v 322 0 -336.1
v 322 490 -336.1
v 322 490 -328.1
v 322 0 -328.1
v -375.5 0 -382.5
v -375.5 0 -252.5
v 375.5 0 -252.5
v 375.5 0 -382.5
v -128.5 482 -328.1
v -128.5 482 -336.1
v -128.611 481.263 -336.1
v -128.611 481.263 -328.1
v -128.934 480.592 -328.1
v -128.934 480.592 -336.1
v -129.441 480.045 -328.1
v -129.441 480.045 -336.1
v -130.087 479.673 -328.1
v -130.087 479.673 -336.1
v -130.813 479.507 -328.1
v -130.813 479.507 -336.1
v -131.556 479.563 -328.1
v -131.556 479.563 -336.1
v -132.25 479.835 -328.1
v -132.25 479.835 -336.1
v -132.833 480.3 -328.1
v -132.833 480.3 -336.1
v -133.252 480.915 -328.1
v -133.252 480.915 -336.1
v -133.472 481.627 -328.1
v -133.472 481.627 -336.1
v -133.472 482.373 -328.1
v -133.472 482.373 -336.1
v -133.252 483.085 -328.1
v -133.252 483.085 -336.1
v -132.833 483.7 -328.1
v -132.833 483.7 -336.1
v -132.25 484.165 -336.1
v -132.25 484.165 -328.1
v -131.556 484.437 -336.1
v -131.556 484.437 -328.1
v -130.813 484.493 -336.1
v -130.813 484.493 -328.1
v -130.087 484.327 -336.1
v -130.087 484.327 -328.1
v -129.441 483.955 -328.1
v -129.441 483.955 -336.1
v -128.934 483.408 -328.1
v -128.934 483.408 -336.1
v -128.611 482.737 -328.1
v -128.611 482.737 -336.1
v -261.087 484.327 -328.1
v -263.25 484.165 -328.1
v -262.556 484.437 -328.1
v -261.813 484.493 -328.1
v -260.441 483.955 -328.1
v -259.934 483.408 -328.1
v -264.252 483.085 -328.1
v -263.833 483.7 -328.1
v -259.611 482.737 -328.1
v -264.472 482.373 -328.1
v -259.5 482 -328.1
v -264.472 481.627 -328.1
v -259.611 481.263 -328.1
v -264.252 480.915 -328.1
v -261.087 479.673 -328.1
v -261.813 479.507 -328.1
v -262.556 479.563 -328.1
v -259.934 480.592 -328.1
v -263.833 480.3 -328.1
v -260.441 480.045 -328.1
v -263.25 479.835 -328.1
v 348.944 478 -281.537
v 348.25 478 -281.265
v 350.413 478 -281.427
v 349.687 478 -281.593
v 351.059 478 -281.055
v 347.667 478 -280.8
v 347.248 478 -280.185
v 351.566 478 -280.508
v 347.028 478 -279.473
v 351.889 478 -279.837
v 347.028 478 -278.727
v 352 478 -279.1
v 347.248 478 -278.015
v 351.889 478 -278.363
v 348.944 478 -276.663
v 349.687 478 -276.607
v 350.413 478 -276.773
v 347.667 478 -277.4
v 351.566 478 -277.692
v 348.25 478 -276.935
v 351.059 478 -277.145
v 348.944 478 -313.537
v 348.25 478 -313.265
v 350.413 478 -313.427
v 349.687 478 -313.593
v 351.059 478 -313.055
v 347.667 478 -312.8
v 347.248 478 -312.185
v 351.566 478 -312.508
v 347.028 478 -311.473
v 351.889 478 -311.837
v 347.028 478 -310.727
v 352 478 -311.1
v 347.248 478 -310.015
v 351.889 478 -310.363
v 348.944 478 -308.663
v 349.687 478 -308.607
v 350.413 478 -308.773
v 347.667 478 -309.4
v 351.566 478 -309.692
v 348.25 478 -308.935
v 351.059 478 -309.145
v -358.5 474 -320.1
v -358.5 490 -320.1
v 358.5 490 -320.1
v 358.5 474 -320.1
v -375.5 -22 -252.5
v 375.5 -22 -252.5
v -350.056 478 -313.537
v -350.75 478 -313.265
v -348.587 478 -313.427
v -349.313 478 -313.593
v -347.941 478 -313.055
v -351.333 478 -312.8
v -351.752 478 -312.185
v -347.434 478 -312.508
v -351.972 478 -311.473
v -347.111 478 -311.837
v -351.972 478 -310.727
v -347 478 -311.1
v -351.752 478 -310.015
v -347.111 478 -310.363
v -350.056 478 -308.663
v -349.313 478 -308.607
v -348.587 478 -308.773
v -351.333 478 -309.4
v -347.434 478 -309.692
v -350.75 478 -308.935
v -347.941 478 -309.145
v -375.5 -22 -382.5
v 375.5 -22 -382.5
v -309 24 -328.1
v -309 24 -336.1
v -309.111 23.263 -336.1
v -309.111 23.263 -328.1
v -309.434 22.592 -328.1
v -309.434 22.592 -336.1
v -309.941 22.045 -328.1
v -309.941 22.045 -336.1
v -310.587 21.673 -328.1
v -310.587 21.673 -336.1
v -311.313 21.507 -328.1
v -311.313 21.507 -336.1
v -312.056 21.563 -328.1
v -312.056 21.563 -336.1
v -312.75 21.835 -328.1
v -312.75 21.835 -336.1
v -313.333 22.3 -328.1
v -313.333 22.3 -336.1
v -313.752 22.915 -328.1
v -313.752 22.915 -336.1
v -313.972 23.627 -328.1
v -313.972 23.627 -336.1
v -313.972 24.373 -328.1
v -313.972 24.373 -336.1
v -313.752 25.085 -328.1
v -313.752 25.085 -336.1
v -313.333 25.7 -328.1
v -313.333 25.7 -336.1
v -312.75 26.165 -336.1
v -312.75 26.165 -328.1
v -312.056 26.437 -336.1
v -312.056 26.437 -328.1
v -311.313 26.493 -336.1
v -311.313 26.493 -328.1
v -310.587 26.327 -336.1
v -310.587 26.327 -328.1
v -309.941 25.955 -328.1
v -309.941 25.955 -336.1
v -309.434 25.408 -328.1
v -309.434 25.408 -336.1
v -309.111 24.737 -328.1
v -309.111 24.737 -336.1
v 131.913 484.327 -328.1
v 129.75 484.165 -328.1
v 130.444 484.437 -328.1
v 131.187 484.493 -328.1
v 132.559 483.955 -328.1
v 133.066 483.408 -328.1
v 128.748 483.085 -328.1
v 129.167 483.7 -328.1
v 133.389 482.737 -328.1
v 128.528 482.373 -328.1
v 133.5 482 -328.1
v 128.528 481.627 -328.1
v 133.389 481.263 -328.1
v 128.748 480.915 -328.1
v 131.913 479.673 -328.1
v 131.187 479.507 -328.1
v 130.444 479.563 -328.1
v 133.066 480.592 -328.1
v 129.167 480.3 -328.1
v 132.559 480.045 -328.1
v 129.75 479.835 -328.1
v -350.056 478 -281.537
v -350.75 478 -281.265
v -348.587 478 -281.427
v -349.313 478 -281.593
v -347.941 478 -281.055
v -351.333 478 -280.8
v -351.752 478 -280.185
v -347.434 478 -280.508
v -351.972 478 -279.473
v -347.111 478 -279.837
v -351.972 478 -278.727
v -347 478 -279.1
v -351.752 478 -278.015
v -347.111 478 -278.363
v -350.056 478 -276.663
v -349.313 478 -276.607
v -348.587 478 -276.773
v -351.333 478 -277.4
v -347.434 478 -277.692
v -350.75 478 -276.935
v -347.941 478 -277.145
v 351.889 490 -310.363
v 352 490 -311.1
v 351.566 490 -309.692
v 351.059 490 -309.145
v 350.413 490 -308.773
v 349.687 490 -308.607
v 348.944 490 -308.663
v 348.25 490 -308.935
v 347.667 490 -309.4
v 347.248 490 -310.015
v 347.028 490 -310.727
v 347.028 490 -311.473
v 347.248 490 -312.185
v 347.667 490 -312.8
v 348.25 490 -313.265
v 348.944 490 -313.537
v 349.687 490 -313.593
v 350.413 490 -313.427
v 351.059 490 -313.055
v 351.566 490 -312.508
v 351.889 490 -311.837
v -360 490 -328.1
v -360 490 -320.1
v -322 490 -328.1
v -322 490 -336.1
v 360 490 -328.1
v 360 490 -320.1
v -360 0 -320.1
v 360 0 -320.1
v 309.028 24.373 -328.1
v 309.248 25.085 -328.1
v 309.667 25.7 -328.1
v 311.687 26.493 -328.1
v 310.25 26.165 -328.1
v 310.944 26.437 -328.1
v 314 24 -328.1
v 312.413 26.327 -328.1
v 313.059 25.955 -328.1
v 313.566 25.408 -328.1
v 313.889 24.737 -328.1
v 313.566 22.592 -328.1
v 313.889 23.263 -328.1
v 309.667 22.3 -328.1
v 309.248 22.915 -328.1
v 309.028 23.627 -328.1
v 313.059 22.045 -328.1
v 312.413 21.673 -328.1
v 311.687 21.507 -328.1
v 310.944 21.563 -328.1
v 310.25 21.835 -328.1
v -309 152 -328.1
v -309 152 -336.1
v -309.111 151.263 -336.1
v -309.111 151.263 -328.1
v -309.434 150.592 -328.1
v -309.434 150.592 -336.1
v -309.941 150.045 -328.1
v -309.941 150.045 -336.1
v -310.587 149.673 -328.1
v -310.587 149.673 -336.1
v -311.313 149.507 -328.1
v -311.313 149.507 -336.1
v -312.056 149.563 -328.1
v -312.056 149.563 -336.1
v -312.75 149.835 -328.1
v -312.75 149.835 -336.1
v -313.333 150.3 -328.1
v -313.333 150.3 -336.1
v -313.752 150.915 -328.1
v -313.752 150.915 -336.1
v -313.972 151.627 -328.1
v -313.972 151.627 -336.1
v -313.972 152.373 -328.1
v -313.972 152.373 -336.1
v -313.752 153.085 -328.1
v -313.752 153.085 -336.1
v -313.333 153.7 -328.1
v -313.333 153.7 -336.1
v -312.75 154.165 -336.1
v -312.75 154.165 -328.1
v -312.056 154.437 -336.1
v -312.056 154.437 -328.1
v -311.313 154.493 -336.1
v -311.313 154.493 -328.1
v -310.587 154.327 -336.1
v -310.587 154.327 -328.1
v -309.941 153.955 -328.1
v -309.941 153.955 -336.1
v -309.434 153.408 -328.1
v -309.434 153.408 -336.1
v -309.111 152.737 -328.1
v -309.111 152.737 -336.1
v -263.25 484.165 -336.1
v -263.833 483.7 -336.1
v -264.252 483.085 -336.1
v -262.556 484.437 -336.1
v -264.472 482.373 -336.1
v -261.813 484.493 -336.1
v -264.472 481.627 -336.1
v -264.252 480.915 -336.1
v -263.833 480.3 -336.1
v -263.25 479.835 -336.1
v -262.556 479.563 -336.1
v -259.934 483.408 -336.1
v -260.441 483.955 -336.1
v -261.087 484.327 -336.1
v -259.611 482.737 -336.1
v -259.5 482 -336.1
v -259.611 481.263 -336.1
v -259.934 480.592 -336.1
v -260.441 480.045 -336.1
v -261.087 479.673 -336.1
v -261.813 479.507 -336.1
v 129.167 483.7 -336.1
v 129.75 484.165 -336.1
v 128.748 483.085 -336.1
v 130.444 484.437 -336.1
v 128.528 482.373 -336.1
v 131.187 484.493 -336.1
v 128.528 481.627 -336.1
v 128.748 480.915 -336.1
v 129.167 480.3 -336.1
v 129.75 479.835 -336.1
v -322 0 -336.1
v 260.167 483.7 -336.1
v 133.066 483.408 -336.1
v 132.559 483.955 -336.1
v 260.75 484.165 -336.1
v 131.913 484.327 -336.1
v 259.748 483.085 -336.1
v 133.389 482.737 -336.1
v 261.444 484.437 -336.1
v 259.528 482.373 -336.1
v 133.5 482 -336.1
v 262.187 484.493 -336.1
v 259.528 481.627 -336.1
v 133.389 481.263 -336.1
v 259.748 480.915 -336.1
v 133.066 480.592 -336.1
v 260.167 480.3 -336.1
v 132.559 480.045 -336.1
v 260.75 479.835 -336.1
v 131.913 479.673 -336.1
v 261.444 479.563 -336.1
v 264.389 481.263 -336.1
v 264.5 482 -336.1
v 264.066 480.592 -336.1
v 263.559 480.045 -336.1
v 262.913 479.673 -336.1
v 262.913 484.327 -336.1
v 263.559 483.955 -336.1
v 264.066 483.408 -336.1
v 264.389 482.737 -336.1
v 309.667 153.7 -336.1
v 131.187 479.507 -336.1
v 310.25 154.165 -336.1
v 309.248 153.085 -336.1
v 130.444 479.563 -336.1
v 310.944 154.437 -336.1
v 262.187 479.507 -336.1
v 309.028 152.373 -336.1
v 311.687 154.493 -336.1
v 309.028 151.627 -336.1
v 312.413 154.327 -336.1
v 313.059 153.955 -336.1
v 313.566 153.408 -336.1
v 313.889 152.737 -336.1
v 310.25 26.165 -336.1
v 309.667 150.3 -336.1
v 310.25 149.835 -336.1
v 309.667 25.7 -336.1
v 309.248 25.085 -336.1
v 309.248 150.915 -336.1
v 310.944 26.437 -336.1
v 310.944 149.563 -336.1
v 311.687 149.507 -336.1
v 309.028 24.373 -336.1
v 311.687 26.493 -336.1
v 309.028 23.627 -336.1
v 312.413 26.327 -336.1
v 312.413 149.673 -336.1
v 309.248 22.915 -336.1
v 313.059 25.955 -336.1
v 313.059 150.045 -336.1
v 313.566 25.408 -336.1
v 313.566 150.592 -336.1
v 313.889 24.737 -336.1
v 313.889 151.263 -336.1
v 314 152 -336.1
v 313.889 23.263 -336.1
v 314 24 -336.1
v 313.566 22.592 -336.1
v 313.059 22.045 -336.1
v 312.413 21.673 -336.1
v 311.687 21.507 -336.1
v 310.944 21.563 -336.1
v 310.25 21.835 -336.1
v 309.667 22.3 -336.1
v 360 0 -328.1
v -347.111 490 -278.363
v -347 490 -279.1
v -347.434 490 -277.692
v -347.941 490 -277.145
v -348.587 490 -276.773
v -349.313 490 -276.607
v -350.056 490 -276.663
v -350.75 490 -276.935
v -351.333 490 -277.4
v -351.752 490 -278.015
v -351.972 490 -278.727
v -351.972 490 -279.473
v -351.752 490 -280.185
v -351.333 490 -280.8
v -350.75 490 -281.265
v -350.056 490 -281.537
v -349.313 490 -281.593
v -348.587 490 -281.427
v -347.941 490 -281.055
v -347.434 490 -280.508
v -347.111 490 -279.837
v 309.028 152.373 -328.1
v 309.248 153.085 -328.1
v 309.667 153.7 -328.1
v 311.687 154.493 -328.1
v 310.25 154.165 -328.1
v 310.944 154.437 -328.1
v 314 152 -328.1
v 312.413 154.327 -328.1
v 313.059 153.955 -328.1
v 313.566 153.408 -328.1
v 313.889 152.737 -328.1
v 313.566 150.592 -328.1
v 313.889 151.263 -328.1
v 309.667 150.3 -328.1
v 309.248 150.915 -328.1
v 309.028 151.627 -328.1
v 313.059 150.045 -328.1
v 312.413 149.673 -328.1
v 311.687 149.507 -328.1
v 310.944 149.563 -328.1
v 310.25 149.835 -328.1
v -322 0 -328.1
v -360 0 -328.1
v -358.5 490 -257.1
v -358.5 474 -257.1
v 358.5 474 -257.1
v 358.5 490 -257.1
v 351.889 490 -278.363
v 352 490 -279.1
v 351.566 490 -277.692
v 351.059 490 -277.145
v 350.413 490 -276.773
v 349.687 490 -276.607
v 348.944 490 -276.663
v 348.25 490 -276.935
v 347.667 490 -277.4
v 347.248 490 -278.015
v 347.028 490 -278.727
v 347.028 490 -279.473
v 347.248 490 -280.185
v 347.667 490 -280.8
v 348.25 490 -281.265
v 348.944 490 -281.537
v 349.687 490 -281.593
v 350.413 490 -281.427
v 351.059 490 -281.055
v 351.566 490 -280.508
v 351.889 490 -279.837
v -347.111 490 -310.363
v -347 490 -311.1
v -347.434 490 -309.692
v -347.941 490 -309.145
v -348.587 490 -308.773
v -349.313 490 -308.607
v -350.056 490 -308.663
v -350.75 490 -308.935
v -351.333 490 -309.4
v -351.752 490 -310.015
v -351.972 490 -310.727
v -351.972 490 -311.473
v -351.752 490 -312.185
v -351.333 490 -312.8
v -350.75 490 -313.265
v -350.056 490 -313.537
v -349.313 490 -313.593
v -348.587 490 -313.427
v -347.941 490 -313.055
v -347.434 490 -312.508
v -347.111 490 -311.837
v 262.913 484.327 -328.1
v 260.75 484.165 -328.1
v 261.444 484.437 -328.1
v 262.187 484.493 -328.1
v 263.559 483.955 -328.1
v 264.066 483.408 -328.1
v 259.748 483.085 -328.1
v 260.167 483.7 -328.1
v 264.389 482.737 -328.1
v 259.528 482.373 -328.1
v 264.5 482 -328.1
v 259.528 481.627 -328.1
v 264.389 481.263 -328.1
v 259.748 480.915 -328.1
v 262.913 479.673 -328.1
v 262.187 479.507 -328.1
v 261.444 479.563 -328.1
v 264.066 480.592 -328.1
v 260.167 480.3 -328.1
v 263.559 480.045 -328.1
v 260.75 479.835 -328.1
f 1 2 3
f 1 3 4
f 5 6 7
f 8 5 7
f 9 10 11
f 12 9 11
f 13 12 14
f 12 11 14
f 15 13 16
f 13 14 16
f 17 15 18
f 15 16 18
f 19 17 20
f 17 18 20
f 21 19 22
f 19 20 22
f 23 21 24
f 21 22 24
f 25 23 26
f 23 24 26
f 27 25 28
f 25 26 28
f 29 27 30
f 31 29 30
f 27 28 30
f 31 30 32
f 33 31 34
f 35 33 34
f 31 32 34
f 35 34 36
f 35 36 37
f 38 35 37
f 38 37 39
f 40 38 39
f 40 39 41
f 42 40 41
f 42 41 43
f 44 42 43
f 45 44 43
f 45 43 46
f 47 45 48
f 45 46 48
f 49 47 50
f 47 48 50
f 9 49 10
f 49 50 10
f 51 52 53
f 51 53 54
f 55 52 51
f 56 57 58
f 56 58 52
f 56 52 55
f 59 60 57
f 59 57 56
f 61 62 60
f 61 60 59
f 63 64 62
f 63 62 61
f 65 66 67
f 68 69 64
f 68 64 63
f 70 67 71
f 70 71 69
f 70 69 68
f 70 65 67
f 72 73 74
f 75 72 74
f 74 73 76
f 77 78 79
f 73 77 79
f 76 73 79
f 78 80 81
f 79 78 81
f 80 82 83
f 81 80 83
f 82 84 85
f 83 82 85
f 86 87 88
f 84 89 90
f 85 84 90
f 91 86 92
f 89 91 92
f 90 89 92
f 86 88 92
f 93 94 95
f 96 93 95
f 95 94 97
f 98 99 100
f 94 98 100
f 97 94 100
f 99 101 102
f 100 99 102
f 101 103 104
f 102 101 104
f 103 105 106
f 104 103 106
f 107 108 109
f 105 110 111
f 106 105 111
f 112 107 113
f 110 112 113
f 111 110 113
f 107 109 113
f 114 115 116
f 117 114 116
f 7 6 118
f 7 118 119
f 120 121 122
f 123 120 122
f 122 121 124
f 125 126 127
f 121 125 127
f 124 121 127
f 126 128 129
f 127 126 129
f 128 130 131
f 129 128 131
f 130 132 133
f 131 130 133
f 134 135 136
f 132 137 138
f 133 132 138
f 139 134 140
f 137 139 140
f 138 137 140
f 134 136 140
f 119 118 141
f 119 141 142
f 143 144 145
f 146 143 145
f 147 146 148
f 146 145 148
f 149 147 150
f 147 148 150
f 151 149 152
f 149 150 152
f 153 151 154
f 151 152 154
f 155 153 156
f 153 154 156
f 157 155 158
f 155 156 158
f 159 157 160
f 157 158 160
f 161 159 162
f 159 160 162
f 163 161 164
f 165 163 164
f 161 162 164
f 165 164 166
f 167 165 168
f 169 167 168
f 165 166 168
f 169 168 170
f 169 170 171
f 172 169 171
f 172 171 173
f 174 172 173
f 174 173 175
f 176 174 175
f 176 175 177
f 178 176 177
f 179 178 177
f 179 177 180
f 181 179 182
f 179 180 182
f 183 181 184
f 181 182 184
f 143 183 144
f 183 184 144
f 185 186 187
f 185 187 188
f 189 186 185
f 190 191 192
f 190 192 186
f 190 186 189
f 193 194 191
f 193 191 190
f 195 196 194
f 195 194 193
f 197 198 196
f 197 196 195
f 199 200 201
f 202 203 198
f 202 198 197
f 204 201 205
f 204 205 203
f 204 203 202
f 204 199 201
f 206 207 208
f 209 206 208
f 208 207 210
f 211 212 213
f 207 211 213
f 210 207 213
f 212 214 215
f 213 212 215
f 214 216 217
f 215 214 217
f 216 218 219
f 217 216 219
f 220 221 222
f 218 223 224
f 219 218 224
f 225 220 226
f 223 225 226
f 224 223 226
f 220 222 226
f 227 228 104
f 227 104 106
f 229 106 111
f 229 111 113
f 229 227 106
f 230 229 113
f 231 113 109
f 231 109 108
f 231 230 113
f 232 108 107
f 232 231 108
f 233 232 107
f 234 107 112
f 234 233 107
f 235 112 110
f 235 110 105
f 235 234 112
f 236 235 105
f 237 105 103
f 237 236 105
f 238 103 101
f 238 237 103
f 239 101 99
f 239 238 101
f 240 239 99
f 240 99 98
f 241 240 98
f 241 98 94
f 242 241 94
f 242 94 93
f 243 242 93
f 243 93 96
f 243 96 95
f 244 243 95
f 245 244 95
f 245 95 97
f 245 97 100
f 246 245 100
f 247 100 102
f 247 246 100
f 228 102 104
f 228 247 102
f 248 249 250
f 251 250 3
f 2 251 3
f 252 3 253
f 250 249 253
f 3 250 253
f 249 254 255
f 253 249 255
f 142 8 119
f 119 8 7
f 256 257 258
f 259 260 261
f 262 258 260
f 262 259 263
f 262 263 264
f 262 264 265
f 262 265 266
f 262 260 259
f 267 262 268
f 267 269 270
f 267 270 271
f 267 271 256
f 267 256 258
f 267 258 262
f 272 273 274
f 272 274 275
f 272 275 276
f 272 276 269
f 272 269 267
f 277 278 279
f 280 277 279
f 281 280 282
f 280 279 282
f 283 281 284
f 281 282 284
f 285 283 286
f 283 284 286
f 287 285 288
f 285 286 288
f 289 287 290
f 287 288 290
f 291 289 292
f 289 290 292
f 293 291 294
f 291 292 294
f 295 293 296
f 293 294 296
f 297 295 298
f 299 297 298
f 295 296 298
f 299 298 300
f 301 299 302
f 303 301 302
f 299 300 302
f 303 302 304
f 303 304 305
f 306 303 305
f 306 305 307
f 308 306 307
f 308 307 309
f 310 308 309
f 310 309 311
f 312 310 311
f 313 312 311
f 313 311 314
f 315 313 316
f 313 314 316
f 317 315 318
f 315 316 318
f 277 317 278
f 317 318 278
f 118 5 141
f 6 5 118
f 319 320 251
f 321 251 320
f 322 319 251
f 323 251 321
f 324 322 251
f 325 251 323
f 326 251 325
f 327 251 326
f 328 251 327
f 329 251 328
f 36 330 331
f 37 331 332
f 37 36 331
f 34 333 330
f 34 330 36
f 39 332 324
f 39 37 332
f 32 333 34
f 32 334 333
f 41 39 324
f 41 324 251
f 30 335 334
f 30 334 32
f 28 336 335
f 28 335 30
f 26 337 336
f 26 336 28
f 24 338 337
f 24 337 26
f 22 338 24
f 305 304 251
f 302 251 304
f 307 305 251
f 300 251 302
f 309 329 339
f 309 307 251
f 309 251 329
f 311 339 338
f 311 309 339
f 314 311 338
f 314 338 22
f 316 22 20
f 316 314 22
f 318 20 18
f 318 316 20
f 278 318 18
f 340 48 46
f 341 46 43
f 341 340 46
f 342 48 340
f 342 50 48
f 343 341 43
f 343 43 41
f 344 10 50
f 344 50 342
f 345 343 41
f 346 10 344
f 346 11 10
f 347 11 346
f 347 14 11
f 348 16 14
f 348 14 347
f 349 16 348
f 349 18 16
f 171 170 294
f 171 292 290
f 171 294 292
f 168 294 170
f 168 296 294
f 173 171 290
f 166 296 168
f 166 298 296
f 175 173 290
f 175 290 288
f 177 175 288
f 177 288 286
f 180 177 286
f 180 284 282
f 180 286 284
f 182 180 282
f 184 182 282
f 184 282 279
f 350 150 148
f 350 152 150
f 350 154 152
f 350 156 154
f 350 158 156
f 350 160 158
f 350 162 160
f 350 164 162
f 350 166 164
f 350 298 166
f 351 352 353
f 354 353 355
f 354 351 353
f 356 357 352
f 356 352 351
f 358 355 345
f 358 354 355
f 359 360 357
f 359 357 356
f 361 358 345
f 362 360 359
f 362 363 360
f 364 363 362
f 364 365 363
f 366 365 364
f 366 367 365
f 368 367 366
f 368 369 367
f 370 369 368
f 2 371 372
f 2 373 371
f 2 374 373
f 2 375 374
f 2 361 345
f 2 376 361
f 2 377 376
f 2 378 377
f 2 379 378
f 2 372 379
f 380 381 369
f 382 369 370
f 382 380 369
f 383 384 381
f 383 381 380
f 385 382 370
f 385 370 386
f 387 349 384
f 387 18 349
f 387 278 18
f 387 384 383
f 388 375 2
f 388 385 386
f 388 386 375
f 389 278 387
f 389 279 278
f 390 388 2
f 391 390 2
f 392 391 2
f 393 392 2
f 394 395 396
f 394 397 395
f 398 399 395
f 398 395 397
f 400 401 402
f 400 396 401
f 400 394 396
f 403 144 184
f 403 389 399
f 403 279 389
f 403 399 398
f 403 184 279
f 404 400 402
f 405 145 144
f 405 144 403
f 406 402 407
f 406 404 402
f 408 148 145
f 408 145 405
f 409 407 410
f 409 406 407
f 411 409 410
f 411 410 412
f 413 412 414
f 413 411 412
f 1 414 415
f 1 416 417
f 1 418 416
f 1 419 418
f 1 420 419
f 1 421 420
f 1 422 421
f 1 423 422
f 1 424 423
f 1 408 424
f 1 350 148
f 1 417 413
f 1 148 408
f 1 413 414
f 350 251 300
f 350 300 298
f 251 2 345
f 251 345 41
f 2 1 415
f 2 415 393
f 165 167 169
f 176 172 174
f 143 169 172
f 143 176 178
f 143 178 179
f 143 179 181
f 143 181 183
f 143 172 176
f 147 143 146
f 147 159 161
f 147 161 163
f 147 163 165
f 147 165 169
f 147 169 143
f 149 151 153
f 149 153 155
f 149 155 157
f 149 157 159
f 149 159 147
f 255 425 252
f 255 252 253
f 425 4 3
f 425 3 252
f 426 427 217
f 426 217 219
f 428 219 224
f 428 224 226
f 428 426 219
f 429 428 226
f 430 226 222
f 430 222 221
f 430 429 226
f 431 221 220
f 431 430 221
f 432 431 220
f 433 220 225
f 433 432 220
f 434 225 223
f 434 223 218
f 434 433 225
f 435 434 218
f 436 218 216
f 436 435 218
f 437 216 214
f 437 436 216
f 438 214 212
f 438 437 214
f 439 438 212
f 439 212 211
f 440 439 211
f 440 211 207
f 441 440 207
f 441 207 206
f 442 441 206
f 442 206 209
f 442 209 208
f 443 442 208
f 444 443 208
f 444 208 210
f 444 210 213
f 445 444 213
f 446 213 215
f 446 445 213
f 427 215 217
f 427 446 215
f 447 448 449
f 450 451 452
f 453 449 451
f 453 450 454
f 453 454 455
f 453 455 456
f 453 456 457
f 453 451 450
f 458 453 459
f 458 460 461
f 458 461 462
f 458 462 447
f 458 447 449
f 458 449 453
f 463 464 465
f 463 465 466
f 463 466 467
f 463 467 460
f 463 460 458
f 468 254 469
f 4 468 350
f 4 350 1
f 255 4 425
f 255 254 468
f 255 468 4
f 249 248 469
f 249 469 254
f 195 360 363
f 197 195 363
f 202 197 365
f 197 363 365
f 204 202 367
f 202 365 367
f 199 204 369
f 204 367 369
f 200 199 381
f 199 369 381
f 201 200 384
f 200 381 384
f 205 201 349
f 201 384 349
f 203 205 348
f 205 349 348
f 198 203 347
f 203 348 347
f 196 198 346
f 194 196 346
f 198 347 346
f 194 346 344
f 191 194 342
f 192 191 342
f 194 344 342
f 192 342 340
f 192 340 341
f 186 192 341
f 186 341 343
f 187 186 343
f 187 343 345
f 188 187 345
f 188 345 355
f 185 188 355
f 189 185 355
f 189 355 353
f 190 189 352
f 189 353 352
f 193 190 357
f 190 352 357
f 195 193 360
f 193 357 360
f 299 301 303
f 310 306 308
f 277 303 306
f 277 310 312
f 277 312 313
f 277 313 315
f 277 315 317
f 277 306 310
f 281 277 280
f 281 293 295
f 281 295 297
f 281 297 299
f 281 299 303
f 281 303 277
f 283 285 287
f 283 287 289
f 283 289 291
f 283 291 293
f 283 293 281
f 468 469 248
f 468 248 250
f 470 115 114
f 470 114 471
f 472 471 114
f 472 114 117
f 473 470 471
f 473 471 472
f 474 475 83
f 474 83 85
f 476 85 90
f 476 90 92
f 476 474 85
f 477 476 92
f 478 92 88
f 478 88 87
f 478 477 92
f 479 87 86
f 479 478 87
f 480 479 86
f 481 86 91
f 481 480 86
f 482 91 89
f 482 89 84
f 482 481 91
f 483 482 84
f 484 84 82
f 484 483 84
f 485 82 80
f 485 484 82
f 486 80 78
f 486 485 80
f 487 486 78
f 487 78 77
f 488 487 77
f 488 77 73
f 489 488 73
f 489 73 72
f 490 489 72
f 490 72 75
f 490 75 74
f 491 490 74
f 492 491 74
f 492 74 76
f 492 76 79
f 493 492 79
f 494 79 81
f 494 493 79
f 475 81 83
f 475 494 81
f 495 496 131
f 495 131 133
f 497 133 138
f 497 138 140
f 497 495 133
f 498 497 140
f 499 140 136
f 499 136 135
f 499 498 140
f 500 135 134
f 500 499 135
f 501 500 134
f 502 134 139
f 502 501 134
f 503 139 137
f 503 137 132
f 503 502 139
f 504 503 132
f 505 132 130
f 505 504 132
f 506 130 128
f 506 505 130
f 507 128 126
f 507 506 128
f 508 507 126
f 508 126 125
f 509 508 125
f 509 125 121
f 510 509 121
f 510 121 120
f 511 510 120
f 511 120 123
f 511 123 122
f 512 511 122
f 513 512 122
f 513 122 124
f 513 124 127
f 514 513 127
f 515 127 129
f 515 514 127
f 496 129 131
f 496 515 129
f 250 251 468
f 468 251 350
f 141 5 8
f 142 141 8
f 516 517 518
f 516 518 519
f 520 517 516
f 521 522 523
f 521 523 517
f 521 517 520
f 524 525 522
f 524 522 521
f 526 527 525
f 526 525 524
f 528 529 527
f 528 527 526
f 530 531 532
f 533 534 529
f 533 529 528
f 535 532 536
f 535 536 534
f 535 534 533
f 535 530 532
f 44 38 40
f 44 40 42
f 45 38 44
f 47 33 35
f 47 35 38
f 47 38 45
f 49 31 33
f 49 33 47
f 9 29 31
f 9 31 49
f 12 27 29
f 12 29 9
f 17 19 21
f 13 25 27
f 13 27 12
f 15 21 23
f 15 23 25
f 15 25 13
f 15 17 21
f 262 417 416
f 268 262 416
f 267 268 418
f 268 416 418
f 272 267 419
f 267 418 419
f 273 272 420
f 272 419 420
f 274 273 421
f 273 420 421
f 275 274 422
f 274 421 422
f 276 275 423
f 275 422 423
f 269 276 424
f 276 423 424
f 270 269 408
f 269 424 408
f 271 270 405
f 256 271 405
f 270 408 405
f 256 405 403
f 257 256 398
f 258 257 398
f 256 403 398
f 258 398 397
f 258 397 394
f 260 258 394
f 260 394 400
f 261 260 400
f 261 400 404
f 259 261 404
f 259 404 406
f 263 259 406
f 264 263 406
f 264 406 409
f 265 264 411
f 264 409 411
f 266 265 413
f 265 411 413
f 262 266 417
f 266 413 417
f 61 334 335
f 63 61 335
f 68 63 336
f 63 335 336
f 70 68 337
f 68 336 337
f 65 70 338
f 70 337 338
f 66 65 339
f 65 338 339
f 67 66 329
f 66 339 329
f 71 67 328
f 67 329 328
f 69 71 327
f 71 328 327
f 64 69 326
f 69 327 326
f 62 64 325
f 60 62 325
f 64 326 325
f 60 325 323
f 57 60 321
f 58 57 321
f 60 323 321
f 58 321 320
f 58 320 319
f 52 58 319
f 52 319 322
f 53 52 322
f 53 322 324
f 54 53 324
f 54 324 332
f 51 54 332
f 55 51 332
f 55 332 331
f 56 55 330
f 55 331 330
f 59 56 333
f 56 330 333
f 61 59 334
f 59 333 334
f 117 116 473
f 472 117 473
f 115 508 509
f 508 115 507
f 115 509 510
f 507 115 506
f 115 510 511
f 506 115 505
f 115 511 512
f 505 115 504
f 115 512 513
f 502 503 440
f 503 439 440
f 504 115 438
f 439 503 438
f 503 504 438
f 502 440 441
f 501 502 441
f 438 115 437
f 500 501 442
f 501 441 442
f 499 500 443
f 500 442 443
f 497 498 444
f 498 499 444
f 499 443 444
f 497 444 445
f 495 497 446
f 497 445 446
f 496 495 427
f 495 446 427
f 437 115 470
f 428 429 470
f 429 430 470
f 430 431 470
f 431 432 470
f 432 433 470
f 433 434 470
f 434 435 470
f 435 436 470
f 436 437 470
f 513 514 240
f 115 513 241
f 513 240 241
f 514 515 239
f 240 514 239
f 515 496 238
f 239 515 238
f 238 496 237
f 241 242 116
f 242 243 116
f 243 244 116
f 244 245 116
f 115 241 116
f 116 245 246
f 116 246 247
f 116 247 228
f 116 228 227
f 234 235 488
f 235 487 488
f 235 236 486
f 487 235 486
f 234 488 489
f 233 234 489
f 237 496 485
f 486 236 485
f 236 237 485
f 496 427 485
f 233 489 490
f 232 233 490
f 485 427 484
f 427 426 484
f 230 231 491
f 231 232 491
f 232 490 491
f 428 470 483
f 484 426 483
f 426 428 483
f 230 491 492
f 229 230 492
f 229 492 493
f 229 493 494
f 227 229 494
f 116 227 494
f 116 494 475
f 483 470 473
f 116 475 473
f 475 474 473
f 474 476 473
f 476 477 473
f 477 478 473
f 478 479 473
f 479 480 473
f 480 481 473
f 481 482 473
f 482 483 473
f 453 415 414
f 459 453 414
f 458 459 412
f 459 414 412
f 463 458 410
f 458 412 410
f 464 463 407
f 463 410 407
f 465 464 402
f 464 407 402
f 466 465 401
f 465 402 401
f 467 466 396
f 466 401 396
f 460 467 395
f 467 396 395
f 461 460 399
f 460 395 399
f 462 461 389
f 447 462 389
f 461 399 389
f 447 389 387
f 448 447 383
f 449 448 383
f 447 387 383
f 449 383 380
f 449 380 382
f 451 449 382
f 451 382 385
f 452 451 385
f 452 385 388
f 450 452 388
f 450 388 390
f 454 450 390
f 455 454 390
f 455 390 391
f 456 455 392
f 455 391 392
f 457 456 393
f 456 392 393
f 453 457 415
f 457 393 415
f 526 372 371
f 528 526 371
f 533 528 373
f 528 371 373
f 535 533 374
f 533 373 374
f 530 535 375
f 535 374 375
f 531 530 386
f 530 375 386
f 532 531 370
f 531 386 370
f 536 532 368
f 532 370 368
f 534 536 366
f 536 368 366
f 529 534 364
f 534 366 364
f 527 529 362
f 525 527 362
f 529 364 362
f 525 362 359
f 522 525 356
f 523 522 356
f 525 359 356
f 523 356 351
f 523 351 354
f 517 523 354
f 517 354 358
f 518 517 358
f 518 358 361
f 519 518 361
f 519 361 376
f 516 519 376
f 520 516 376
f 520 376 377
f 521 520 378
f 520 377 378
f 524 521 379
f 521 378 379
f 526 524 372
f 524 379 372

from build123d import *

# Parameters (mm, degrees)
F6_W      = 720
F6_H      = 16
F7_DEPTH  = 490
F8_W      = 38
F8_H      = 490.0000000001
F8_H_2    = 490
F8_R      = 2.5
F9_DEPTH  = 8
F5_W      = 717
F5_H      = 63
F10_DEPTH = 16
F11_R     = 2.5
F12_DEPTH = 12
F3_W      = 751
F3_H      = 130
F13_DEPTH = 22


with BuildPart() as f7:
    # F6 (on Front) → F7 (new body, through all)
    with BuildSketch(Plane.XZ):
        with Locations((0, -328.1)):
            Rectangle(F6_W, F6_H)
    extrude(amount=-F7_DEPTH)

    # F8 (on face) → F9 (cut)
    with BuildSketch(Plane(origin=(0, 0, -336.1), x_dir=(1, 0, 0), z_dir=(0, 0, -1))):
        with Locations((-341, -245.0000000001)):
            Rectangle(F8_W, F8_H)
        with Locations((341, -245)):
            Rectangle(F8_W, F8_H_2)
        with Locations((-311.5, -24)):
            Circle(F8_R)
        with Locations((-311.5, -152)):
            Circle(F8_R)
        with Locations((311.5, -152)):
            Circle(F8_R)
        with Locations((311.5, -24)):
            Circle(F8_R)
        with Locations((-262, -482)):
            Circle(F8_R)
        with Locations((-131, -482)):
            Circle(F8_R)
        with Locations((131, -482)):
            Circle(F8_R)
        with Locations((262, -482)):
            Circle(F8_R)
    extrude(amount=-F9_DEPTH, mode=Mode.SUBTRACT)


with BuildPart() as f10:
    # F5 (on offset) → F10 (new body)
    with BuildSketch(Plane.XZ.offset(-490)):
        with Locations((0, -288.6)):
            Rectangle(F5_W, F5_H)
    extrude(amount=F10_DEPTH)

    # F11 (on face) → F12 (cut)
    with BuildSketch(Plane.XZ.offset(-490)):
        with Locations((349.5, -311.1)):
            Circle(F11_R)
        with Locations((349.5, -279.1)):
            Circle(F11_R)
        with Locations((349.5, -247.1)):
            Circle(F11_R)
        with Locations((-349.5, -247.1)):
            Circle(F11_R)
        with Locations((-349.5, -279.1)):
            Circle(F11_R)
        with Locations((-349.5, -311.1)):
            Circle(F11_R)
    extrude(amount=F12_DEPTH, mode=Mode.SUBTRACT)


with BuildPart() as f13:
    # F3 (on face) → F13 (new body)
    with BuildSketch(Plane.XZ):
        with Locations((0, -317.5)):
            Rectangle(F3_W, F3_H)
    extrude(amount=F13_DEPTH)


solid = Compound([f7.part, f10.part, f13.part])
